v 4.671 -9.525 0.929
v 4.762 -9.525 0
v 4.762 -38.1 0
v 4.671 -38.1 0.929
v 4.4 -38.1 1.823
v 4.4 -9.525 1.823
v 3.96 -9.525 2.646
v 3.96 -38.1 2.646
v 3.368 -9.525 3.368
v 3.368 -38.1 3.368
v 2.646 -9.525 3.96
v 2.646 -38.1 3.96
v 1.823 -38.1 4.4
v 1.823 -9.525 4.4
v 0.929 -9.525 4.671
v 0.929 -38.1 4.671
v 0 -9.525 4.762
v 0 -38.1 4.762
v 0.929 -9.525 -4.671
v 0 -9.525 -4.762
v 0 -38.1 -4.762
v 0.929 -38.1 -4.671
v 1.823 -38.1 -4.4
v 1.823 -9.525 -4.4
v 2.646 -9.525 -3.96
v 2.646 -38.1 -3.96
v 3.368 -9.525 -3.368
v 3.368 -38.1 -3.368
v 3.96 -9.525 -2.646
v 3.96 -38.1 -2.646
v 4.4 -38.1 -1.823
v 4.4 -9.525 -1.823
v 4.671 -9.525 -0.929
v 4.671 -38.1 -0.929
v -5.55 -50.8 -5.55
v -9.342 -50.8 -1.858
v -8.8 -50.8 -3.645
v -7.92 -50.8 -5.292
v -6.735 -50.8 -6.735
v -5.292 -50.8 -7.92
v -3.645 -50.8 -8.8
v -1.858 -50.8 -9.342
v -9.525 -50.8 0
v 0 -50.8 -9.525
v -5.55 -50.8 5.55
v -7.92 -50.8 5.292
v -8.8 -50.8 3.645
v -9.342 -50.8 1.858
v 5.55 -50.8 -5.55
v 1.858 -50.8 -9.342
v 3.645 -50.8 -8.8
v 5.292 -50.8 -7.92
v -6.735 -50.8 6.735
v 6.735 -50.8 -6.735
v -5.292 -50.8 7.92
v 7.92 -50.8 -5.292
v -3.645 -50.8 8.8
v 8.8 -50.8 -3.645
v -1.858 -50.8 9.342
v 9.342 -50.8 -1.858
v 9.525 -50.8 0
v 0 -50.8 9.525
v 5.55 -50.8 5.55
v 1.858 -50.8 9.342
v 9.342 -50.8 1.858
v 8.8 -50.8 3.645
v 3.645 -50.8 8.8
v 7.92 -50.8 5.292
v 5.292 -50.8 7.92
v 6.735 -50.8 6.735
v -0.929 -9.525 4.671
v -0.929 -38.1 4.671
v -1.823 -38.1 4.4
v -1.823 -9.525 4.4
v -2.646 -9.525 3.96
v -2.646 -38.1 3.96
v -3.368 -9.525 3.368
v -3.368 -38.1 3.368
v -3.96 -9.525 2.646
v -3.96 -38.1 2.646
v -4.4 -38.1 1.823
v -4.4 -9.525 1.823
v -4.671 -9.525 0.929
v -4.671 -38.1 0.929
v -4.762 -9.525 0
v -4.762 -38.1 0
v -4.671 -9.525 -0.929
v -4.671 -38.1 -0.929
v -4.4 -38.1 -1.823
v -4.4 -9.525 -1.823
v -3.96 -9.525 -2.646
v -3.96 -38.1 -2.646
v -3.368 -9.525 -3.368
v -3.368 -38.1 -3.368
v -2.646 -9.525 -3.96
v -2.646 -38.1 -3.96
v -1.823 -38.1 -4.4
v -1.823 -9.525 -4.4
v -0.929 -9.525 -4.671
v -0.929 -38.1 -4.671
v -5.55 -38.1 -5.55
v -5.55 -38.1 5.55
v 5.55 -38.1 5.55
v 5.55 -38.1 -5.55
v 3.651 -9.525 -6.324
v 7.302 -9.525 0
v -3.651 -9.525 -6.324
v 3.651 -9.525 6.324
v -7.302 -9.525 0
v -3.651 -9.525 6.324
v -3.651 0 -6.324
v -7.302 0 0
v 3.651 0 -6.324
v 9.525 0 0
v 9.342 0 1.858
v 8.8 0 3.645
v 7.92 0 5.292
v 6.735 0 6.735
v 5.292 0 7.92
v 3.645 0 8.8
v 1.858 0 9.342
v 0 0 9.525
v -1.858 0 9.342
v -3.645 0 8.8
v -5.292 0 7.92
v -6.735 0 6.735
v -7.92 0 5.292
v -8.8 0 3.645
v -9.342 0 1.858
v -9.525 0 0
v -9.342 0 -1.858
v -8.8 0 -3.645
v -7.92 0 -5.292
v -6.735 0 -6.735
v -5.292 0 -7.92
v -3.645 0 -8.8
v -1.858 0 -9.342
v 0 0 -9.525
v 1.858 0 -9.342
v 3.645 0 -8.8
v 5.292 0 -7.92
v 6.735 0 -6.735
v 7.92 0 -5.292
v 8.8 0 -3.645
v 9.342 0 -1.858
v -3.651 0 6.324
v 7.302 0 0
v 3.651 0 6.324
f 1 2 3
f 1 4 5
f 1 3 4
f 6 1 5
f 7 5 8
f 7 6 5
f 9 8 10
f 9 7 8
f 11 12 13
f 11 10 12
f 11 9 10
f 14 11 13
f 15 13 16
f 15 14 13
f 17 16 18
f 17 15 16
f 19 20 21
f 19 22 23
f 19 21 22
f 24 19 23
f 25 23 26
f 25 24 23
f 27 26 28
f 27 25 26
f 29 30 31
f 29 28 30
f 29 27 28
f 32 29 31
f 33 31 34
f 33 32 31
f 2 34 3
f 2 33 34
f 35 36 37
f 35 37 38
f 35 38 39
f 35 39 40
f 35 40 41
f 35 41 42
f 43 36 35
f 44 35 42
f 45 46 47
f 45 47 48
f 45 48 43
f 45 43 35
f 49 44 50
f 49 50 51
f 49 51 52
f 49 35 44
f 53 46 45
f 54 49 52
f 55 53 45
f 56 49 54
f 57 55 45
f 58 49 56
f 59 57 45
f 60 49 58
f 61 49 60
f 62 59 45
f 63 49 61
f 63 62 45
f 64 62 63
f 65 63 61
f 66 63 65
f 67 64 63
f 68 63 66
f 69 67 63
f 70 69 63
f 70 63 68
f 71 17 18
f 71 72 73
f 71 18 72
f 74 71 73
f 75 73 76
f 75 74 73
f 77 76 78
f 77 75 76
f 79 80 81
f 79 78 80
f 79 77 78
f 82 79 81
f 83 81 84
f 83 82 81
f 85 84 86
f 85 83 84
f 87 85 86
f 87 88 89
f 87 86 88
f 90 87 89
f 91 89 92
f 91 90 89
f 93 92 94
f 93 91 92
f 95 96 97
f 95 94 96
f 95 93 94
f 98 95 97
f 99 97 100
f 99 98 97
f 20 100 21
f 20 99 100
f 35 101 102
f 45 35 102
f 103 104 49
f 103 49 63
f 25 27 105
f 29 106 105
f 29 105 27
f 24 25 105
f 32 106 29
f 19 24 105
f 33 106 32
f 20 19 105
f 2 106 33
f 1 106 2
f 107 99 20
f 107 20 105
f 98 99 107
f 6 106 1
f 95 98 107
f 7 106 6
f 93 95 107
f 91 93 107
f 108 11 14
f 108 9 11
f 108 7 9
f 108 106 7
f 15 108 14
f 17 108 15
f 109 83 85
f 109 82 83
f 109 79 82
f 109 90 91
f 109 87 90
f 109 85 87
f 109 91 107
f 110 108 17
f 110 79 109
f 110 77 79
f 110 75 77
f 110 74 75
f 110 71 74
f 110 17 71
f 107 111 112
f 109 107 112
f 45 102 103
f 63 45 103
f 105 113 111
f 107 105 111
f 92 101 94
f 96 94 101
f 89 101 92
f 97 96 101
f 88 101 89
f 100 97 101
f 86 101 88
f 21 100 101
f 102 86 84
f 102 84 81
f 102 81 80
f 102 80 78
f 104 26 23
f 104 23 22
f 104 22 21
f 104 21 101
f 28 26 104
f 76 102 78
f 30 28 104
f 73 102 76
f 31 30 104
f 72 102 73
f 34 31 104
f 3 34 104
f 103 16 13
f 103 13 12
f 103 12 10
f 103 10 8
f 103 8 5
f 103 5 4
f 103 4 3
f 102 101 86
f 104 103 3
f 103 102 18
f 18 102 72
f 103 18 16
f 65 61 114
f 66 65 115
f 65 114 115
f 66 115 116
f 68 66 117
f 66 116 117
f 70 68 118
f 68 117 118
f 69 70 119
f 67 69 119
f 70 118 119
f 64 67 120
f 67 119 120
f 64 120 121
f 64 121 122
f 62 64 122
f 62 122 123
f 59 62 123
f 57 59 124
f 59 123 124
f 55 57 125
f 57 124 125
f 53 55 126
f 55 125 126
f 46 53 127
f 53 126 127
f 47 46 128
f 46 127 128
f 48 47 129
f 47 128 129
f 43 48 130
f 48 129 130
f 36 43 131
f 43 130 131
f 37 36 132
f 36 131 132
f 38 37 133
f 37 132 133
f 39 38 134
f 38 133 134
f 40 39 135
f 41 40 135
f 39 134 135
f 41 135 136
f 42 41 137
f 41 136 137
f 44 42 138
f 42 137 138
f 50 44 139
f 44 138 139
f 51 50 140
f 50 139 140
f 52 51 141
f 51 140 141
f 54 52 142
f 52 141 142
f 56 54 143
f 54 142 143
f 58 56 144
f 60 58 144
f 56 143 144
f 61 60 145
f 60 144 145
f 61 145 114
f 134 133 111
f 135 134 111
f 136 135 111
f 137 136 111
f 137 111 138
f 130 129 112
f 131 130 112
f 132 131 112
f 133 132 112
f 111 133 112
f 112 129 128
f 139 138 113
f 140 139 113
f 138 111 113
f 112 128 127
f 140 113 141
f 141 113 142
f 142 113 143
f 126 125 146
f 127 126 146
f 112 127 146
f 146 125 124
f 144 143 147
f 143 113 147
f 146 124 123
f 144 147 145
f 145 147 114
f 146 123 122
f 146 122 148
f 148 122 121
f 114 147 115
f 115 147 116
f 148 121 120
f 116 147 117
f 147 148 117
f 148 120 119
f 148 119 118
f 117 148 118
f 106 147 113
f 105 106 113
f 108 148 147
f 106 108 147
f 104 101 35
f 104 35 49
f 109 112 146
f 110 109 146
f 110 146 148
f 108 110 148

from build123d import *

# Parameters (mm, degrees)
F0_R      = 9.525
F1_DEPTH  = 25.4
F1_FACE_R = 9.525
F2_DEPTH  = 25.4
F4_DEPTH  = 50.801
F6_DEPTH  = 9.525
F7_W      = 11.0998
F7_H      = 11.0998
F8_DEPTH  = 12.7


with BuildPart() as f1:
    # F0 (on Front) → F1 (new body)
    with BuildSketch(Plane.XZ):
        Circle(F0_R)
    extrude(amount=F1_DEPTH)

    # F1_face (on face) → F2 (join)
    with BuildSketch(Plane.XZ.offset(25.4)):
        Circle(F1_FACE_R)
    extrude(amount=F2_DEPTH)

    # F3 (on Front) → F4 (cut, through all)
    with BuildSketch(Plane.XZ):
        with BuildLine():
            ThreePointArc((4.7625, 0), (3.367596, 3.367596), (0, 4.7625))
            ThreePointArc((0, 4.7625), (-3.367596, 3.367596), (-4.7625, 0))
            ThreePointArc((-4.7625, 0), (-3.367596, -3.367596), (0, -4.7625))
            ThreePointArc((0, -4.7625), (3.367596, -3.367596), (4.7625, 0))
        make_face()
    extrude(amount=F4_DEPTH, mode=Mode.SUBTRACT)

    # F5 (on face) → F6 (cut)
    with BuildSketch(Plane(origin=(0, 0, 0), x_dir=(-1, 0, 0), z_dir=(0, 1, 0))):
        Polygon((3.65125, 6.324151), (-3.65125, 6.324151), (-7.3025, 0), (-3.65125, -6.324151), (3.65125, -6.324151), (7.3025, 0), align=None)
    extrude(amount=-F6_DEPTH, mode=Mode.SUBTRACT)

    # F7 (on face) → F8 (cut)
    with BuildSketch(Plane.XZ.offset(50.8)):
        Rectangle(F7_W, F7_H)
    extrude(amount=-F8_DEPTH, mode=Mode.SUBTRACT)


solid = f1.part
